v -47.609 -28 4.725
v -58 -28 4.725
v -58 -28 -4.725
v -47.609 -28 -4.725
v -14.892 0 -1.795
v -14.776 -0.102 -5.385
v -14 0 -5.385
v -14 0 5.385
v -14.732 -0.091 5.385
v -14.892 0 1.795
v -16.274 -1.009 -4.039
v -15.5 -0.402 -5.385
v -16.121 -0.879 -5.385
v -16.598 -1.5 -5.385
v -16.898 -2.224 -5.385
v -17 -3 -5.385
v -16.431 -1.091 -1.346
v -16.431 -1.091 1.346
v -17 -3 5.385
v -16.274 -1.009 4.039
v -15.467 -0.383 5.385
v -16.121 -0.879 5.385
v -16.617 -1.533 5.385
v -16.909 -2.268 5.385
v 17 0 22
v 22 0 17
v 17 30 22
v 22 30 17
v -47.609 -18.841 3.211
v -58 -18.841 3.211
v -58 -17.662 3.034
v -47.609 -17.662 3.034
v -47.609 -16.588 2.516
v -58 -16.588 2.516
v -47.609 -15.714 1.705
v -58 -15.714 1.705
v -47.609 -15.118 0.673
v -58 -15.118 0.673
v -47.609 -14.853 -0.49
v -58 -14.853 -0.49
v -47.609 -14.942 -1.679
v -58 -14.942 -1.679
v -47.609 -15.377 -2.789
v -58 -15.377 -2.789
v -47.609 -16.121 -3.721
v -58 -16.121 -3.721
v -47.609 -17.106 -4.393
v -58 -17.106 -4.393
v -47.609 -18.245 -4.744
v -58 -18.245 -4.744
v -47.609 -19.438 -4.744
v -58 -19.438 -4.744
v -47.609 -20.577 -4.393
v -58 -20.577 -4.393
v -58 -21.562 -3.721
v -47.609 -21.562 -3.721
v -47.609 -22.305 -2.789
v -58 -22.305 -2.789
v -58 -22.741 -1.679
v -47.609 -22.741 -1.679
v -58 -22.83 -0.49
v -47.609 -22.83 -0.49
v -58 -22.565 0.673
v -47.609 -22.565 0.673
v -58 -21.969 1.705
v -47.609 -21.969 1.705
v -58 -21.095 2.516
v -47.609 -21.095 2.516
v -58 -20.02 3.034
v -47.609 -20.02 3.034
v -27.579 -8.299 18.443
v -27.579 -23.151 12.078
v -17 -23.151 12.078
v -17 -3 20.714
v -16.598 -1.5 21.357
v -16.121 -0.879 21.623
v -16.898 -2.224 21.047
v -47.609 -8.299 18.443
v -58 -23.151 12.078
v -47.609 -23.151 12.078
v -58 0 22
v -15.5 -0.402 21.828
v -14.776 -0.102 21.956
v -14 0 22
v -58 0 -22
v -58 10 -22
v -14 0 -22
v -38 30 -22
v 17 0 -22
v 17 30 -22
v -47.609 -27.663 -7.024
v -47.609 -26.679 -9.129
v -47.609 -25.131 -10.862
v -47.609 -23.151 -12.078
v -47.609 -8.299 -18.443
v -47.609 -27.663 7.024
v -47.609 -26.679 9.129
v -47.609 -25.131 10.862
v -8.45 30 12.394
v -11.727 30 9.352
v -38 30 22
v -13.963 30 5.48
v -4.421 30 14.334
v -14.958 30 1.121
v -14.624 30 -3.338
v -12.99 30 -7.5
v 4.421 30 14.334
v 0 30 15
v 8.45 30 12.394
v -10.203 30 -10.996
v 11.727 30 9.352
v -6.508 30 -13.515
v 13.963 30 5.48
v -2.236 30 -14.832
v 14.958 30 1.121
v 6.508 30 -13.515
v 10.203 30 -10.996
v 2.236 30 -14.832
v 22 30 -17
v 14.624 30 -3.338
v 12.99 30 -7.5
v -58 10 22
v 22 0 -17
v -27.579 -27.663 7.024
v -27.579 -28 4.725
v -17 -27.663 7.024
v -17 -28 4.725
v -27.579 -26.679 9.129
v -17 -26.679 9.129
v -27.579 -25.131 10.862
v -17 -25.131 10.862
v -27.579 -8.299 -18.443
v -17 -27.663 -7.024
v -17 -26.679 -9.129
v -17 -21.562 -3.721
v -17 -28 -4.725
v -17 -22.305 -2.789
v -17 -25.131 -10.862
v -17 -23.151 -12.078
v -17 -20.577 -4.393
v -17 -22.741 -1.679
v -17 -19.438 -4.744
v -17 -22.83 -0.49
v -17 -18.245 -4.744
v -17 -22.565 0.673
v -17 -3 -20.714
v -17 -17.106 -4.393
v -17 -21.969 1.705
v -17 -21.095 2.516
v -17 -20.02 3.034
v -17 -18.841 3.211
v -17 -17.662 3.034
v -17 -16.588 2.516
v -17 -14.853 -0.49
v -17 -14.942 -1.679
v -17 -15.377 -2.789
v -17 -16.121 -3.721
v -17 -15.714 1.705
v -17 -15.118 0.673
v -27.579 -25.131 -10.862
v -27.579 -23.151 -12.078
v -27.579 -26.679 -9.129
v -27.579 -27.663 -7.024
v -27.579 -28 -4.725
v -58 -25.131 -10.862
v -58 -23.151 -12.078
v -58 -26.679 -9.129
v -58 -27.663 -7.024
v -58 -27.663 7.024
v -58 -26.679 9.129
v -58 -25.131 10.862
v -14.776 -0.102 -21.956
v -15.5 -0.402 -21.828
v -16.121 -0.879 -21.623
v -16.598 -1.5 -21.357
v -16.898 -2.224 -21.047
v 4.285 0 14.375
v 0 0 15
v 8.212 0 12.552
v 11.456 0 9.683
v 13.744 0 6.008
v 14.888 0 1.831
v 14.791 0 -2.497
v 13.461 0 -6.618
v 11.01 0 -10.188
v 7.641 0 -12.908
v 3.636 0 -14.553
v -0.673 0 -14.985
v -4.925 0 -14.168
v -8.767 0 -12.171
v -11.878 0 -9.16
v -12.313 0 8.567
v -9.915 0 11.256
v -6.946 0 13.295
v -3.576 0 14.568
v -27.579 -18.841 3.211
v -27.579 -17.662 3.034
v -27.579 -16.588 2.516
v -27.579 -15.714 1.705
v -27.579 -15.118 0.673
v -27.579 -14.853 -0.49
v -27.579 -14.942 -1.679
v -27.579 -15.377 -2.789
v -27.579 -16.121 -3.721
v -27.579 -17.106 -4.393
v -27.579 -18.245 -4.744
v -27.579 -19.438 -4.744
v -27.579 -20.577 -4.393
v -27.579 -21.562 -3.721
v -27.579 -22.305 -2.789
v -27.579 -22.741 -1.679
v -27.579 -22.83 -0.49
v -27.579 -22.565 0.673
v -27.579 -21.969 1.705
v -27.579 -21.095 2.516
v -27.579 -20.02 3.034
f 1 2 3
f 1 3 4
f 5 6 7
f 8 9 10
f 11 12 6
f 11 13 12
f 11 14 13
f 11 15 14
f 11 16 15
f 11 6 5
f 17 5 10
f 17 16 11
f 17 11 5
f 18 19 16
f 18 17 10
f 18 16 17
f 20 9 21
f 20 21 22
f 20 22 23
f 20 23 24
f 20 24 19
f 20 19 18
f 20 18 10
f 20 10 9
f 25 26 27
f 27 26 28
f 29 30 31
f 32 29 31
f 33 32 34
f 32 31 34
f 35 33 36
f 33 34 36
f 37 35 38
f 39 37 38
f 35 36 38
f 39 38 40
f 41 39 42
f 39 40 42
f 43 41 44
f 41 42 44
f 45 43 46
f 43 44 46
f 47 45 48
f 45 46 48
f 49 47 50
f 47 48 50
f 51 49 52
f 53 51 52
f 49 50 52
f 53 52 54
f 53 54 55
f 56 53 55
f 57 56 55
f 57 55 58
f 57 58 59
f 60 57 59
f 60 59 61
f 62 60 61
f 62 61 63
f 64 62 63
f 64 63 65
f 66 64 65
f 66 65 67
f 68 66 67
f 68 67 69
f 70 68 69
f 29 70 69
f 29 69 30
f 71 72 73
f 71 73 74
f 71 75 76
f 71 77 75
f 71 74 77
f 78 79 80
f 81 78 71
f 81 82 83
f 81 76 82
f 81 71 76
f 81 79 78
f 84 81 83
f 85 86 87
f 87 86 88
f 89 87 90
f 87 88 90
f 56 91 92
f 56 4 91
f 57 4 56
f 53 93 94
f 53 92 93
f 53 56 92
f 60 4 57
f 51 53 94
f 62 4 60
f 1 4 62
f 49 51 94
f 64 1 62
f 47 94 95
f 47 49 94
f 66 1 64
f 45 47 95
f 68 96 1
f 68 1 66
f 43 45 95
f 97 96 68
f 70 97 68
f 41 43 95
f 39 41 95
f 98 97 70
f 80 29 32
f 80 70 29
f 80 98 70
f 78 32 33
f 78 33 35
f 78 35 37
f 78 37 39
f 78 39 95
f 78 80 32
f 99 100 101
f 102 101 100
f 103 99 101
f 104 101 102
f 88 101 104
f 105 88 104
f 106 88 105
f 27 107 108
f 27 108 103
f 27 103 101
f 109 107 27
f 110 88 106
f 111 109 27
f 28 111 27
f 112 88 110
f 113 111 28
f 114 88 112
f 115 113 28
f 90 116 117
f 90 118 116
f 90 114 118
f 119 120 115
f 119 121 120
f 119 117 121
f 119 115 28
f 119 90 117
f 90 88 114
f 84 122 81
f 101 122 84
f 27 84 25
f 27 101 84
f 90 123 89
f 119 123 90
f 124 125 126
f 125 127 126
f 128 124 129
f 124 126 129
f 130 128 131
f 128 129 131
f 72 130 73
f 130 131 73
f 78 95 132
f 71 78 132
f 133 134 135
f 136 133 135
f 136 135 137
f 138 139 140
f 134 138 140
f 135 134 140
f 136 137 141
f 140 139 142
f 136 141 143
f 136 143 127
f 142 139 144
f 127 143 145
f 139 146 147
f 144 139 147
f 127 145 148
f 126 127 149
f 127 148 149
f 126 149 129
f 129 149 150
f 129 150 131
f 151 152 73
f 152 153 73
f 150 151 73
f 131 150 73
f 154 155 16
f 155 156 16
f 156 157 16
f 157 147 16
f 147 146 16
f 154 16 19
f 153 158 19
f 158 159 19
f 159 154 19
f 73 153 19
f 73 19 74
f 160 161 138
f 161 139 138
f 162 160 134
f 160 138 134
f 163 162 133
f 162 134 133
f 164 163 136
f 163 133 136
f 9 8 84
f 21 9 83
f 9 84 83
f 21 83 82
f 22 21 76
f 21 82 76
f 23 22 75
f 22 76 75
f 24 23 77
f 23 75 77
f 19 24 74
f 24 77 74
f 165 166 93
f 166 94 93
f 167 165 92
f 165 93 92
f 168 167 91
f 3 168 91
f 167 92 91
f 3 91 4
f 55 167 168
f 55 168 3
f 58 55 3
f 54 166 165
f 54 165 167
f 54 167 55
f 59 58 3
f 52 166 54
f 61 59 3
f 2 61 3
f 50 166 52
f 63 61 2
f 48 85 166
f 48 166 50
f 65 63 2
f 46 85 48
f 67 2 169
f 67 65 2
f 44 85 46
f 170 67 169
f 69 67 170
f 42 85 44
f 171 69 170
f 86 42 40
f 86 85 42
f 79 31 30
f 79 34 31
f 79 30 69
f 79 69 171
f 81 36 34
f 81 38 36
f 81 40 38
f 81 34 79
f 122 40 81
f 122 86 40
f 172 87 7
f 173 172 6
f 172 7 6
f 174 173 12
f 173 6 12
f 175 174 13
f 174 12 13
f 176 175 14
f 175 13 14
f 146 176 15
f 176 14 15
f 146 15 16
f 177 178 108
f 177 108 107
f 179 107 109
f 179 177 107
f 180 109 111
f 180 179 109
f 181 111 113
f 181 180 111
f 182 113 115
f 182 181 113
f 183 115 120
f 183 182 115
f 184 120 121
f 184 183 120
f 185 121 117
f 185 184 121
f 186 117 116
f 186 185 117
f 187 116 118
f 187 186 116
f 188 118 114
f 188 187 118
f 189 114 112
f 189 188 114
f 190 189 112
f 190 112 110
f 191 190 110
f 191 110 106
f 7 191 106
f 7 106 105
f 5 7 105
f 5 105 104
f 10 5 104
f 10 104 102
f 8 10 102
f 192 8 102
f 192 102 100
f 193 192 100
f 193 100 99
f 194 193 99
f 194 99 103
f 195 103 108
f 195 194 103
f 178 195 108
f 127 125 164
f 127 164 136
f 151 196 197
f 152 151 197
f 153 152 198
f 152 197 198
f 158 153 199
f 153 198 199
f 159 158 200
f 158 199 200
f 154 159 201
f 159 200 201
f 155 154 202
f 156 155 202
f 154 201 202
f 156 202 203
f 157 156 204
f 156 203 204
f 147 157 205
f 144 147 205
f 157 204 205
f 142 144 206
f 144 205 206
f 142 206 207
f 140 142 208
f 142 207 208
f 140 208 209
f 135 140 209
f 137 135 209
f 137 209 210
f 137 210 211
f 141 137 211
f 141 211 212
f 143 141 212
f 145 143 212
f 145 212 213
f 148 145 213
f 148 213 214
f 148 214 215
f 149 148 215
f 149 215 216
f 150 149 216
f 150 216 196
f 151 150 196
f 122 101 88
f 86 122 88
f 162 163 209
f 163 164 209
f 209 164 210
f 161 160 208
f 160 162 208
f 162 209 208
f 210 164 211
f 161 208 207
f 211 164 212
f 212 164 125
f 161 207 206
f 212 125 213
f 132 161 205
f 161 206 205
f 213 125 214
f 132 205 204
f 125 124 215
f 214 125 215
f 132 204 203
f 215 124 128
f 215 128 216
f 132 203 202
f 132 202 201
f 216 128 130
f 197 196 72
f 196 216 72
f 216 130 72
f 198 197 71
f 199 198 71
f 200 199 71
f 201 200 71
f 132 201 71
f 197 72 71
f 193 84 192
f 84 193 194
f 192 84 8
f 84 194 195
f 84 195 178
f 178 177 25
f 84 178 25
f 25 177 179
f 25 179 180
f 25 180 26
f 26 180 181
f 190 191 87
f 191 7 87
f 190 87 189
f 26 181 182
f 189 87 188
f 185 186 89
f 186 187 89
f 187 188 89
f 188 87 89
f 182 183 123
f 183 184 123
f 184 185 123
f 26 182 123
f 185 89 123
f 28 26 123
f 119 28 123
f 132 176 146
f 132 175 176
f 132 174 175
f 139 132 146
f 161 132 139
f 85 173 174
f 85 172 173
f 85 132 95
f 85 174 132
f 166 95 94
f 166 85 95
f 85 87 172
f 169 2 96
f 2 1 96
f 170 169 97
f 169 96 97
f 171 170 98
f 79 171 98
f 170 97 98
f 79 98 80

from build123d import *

# Parameters (mm, degrees)
SKETCH_1_W          = 80
SKETCH_1_H          = 44
SKETCH_1_R          = 15
EXTRUDE_1_DEPTH     = 30
CHAMFER_1_SIZE      = 20
SKETCH_2_W          = 41
SKETCH_2_H          = 44
EXTRUDE_2_DEPTH     = 28
SKETCH_3_R          = 4
CUT_EXTRUDE_1_DEPTH = 89.22698
SKETCH_4_W          = 20.030013647
SKETCH_4_H          = 19.701271899
CUT_EXTRUDE_2_DEPTH = 79.74007874
CHAMFER_4_SIZE      = 5
FILLET_1_R          = 3
CUT_EXTRUDE_3_DEPTH = 89.226980059
FILLET_2_R          = 8


with BuildPart() as part:
    # Эскиз1 → Вытянуть1 (new body)
    with BuildSketch(Plane(origin=(0, 0, 0), x_dir=(1, 0, 0), z_dir=(0, 1, 0))):
        with Locations((-18, 0)):
            Rectangle(SKETCH_1_W, SKETCH_1_H)
        with Locations(Location((0, 0, 0), (0, 0, 270))):
            Circle(SKETCH_1_R, mode=Mode.SUBTRACT)
    extrude(amount=EXTRUDE_1_DEPTH)

    # Фаска1
    chamfer_1_edges = [part.edges().sort_by_distance(p)[0] for p in [
        (-58, 30, 0),
    ]]
    chamfer(chamfer_1_edges, length=CHAMFER_1_SIZE)

    # Эскиз2 → Вытянуть2 (add)
    with BuildSketch(Plane.XZ):
        with Locations((-37.5, 0)):
            Rectangle(SKETCH_2_W, SKETCH_2_H)
    extrude(amount=EXTRUDE_2_DEPTH)

    # Эскиз3 → Вырез-Вытянуть1 (cut, through all)
    with BuildSketch(Plane.ZY.offset(58)):
        with Locations((-0.788742376, -18.841346952)):
            Circle(SKETCH_3_R)
    extrude(amount=-CUT_EXTRUDE_1_DEPTH, mode=Mode.SUBTRACT)

    # Эскиз4 → Вырез-Вытянуть2 (cut, through all)
    with BuildSketch(Plane.XY.offset(22)):
        with Locations((-37.59406334, -18.149364051)):
            Rectangle(SKETCH_4_W, SKETCH_4_H)
    extrude(amount=-CUT_EXTRUDE_2_DEPTH, mode=Mode.SUBTRACT)

    # Фаска4
    chamfer_4_edges = [part.edges().sort_by_distance(p)[0] for p in [
        (22, 15, -22),
        (22, 15, 22),
    ]]
    chamfer(chamfer_4_edges, length=CHAMFER_4_SIZE)

    # Скругление1
    fillet_1_edges = [part.edges().sort_by_distance(p)[0] for p in [
        (-17, 0, 0),
    ]]
    fillet(fillet_1_edges, radius=FILLET_1_R)

    # Эскиз5 → Вырез-Вытянуть3 (cut, through all)
    with BuildSketch(Plane.ZY.offset(58)):
        Polygon((-22, 0), (-10, -28), (-22, -28), align=None)
        Polygon((22, -28), (10, -28), (22, 0), align=None)
    extrude(amount=-CUT_EXTRUDE_3_DEPTH, mode=Mode.SUBTRACT)

    # Скругление2
    fillet_2_edges = [part.edges().sort_by_distance(p)[0] for p in [
        (-22.289528258, -28, -10),
        (-52.804535082, -28, -10),
        (-52.804535082, -28, 10),
        (-22.289528258, -28, 10),
    ]]
    fillet(fillet_2_edges, radius=FILLET_2_R)


solid = part.part
